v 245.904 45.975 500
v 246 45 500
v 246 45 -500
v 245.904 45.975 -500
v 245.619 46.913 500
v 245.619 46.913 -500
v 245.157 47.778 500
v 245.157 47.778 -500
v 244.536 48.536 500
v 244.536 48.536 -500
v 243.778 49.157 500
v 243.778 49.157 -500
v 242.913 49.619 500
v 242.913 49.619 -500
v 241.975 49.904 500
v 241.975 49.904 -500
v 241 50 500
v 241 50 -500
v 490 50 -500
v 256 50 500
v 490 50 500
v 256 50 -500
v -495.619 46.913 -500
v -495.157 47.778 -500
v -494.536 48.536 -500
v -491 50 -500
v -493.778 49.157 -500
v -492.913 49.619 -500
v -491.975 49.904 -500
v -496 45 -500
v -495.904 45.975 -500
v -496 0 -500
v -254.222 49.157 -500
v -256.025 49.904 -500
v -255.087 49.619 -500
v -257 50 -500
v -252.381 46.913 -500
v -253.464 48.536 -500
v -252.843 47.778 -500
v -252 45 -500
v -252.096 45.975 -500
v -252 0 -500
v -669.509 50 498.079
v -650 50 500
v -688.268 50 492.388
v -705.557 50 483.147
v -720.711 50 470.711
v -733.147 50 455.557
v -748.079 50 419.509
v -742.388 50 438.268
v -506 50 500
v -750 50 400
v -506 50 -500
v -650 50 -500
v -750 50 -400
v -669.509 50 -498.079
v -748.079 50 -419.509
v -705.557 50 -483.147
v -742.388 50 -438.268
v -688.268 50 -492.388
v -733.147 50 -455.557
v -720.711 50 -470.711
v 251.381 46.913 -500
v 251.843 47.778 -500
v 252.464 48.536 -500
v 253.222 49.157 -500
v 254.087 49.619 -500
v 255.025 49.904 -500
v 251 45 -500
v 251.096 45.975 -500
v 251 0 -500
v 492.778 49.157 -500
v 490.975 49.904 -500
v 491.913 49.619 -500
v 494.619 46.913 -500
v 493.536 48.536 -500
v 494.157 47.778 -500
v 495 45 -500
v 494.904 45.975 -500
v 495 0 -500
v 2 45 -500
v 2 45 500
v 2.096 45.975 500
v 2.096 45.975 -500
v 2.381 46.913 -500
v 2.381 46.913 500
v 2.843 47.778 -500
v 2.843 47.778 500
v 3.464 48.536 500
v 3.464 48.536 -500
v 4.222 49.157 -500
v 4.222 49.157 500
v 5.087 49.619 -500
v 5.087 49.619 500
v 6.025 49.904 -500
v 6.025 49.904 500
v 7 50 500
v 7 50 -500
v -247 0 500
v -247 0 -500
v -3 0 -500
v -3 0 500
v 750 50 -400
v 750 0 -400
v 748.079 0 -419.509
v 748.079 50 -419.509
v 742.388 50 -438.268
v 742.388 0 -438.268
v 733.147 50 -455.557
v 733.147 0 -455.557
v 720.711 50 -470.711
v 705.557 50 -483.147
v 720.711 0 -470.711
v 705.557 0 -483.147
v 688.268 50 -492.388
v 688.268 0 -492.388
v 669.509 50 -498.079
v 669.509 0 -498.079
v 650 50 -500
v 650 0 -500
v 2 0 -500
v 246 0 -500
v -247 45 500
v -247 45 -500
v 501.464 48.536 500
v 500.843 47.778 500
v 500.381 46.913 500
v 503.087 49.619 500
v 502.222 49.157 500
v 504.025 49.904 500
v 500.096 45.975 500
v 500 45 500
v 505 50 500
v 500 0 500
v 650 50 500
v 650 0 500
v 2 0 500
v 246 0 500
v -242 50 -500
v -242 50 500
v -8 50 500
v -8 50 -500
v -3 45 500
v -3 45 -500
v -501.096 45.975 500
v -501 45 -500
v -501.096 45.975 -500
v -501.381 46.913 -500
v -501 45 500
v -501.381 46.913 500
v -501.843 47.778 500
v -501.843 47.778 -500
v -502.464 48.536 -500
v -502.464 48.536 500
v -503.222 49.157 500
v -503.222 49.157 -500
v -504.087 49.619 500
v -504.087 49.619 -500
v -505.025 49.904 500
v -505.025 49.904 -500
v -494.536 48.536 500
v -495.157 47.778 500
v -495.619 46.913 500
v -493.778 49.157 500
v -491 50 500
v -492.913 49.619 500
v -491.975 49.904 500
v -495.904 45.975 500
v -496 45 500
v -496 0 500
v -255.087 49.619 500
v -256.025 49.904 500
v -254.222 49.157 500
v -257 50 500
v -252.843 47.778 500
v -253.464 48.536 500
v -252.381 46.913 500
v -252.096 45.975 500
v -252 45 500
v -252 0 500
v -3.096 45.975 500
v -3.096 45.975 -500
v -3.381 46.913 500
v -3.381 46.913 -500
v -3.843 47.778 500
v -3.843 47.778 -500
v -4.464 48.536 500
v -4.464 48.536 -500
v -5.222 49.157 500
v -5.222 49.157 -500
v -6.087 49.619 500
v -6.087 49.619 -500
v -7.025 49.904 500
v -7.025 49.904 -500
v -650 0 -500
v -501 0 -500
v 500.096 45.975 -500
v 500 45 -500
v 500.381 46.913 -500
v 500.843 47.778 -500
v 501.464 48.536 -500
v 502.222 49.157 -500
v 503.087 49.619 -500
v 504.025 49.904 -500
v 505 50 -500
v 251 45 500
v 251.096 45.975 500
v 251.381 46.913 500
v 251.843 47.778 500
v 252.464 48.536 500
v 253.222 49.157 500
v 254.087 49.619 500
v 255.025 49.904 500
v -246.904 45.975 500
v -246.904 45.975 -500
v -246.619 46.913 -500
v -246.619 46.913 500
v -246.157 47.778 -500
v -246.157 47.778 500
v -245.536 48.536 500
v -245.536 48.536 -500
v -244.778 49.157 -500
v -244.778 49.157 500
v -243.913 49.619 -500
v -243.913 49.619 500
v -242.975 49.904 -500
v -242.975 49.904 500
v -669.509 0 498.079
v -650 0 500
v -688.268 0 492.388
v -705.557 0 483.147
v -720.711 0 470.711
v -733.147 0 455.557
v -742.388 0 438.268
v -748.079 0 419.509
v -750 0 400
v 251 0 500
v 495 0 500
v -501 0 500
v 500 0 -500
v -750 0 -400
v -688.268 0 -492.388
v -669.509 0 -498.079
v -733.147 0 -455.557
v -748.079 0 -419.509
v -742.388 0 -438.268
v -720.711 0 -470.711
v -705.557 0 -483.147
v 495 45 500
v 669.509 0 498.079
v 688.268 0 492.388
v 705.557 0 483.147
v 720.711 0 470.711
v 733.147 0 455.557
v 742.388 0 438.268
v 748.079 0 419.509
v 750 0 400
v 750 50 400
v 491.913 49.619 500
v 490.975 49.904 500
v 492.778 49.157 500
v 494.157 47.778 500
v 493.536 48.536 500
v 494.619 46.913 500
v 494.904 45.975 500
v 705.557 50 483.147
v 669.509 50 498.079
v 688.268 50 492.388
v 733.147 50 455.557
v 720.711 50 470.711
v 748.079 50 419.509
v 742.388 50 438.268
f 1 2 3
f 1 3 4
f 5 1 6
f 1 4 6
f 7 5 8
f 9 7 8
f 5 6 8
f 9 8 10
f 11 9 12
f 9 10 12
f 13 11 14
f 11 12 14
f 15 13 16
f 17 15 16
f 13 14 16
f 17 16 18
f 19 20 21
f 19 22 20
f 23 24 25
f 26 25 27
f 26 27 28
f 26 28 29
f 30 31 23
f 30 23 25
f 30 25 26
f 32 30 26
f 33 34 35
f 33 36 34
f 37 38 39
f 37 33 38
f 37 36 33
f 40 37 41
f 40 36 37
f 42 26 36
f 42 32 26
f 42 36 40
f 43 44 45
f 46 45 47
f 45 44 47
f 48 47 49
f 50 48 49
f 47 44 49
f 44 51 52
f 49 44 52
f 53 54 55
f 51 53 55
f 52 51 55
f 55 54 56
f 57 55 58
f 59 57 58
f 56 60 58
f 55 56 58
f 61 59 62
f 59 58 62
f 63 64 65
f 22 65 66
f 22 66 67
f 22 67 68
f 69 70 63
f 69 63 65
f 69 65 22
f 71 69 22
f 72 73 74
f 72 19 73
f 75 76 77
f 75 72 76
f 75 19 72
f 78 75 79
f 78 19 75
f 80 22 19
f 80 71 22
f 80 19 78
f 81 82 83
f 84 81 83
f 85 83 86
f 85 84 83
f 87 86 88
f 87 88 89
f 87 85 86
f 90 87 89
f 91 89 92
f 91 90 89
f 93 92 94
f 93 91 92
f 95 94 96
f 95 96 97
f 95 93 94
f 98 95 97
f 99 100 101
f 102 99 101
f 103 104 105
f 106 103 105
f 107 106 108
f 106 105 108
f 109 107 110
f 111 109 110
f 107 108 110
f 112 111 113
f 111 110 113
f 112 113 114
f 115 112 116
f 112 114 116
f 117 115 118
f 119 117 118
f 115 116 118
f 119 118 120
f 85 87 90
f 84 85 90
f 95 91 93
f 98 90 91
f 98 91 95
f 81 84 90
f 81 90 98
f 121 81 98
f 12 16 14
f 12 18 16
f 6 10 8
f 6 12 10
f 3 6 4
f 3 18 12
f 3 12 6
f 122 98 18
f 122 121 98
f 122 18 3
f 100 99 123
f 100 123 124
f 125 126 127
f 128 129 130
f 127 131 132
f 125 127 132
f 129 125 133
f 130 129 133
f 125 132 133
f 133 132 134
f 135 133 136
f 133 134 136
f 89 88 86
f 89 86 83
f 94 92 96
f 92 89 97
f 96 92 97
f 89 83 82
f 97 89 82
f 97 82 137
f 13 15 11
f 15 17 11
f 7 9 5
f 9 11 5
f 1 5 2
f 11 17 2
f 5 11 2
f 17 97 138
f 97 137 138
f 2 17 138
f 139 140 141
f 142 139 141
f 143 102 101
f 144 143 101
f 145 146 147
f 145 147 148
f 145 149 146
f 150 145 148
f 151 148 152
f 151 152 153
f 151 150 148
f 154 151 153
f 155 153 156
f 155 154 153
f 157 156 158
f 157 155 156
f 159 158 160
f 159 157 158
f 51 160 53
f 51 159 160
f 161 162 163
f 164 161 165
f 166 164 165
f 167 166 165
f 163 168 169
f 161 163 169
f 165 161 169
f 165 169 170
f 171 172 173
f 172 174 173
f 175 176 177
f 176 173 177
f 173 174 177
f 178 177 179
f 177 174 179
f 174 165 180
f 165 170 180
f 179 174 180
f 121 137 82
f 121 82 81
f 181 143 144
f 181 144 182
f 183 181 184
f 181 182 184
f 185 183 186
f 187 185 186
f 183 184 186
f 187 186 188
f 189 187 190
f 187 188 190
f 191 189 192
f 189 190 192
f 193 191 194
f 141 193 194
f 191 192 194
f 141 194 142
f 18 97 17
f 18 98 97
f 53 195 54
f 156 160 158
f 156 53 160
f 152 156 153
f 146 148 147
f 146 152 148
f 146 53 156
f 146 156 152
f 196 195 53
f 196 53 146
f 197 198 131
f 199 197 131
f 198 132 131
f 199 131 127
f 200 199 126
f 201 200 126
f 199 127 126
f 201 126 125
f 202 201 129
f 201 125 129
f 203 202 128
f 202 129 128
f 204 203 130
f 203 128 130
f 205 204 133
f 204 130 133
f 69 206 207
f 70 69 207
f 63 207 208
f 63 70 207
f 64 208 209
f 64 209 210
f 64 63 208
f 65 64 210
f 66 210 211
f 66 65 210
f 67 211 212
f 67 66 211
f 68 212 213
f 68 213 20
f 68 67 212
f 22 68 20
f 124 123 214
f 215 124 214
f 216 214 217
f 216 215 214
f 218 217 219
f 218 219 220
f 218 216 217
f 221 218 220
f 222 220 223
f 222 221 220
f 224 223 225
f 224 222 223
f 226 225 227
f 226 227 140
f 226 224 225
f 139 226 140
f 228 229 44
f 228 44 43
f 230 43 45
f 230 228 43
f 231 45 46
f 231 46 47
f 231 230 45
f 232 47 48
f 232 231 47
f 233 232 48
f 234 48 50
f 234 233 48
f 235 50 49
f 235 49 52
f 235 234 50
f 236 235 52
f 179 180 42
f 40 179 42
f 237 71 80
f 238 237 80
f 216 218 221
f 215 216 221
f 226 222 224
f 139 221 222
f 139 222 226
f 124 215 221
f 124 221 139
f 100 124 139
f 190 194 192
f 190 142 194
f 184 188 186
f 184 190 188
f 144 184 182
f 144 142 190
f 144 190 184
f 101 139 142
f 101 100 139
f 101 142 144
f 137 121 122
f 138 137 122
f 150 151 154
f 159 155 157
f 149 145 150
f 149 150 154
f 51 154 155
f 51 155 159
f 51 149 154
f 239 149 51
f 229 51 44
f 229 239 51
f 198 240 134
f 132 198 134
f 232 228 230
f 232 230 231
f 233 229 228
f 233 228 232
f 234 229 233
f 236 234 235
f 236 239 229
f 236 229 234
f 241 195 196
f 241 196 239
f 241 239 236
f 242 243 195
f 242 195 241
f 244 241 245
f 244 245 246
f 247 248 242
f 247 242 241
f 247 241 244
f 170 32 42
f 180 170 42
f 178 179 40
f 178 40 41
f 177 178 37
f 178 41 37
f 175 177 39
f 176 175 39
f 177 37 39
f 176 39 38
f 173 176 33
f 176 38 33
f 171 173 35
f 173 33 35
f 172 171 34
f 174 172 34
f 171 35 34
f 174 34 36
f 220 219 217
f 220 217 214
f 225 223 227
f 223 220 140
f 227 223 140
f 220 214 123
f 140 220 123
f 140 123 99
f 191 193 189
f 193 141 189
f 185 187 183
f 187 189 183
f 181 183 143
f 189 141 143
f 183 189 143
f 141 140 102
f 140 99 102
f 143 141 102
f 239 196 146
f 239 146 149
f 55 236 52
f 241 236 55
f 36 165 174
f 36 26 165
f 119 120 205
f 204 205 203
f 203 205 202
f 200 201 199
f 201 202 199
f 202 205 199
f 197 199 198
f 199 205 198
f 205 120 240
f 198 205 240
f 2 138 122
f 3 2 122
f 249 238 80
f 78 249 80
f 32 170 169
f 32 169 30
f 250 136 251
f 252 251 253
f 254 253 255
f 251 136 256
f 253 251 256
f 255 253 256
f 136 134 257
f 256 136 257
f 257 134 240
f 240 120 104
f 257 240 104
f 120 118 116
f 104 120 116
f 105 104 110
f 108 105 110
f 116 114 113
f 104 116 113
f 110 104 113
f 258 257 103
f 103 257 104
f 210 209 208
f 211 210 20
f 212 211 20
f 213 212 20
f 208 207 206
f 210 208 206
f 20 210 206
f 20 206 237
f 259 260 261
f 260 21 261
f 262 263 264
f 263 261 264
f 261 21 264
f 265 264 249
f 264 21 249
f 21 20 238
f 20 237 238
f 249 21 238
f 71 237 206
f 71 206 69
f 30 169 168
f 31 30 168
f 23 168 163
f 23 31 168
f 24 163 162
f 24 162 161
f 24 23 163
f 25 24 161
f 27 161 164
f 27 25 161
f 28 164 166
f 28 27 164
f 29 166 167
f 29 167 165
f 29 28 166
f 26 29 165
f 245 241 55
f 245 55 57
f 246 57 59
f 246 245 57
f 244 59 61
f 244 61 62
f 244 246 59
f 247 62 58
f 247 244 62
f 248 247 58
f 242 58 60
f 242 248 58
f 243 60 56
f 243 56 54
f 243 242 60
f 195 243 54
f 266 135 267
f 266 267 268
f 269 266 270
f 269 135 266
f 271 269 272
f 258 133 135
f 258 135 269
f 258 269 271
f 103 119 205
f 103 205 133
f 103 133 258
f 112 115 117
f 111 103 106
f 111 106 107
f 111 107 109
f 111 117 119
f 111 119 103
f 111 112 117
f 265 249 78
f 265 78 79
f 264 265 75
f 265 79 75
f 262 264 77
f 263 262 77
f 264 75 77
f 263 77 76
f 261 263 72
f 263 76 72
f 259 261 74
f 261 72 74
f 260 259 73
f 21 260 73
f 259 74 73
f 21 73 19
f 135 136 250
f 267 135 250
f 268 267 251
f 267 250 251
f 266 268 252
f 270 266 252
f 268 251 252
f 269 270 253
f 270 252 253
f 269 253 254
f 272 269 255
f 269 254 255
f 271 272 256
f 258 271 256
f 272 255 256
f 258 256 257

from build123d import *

# Parameters (mm, degrees)
SALIENTE_EXTRUIR3_DEPTH   = 50
CROQUIS1_W                = 244
CROQUIS1_H                = 1000
SALIENTE_EXTRUIR3_2_DEPTH = 50
SALIENTE_EXTRUIR3_3_DEPTH = 50
SALIENTE_EXTRUIR3_4_DEPTH = 50
SALIENTE_EXTRUIR3_5_DEPTH = 50
SALIENTE_EXTRUIR3_6_DEPTH = 50
REDONDEO1_R               = 5
REDONDEO2_R               = 5
REDONDEO3_R               = 5
REDONDEO4_R               = 5
REDONDEO5_R               = 5
REDONDEO6_R               = 5


with BuildPart() as part:
    # Croquis1 → Saliente-Extruir3 (new body)
    with BuildSketch(Plane(origin=(0, 0, 0), x_dir=(1, 0, 0), z_dir=(0, 1, 0))):
        with BuildLine():
            ThreePointArc((-650, -500), (-720.710678119, -470.710678119), (-750, -400))
            Line((-750, -400), (-750, 400))
            ThreePointArc((-750, 400), (-720.710678119, 470.710678119), (-650, 500))
            Line((-650, 500), (-501, 500))
            Line((-501, 500), (-501, -500))
            Line((-501, -500), (-650, -500))
        make_face()
    extrude(amount=SALIENTE_EXTRUIR3_DEPTH)

    # Redondeo1
    redondeo1_edges = [part.edges().sort_by_distance(p)[0] for p in [
        (-501, 50, 0),
    ]]
    fillet(redondeo1_edges, radius=REDONDEO1_R)


with BuildPart() as body_2:
    # Croquis1 → Saliente-Extruir3 2 (new body)
    with BuildSketch(Plane(origin=(0, 0, 0), x_dir=(1, 0, 0), z_dir=(0, 1, 0))):
        with Locations((-374, 0)):
            Rectangle(CROQUIS1_W, CROQUIS1_H)
    extrude(amount=SALIENTE_EXTRUIR3_2_DEPTH)

    # Redondeo2
    redondeo2_edges = [body_2.edges().sort_by_distance(p)[0] for p in [
        (-496, 50, 0),
        (-252, 50, 0),
    ]]
    fillet(redondeo2_edges, radius=REDONDEO2_R)


with BuildPart() as body_3:
    # Croquis1 → Saliente-Extruir3 3 (new body)
    with BuildSketch(Plane(origin=(0, 0, 0), x_dir=(1, 0, 0), z_dir=(0, 1, 0))):
        with Locations((-125, 0)):
            Rectangle(CROQUIS1_W, CROQUIS1_H)
    extrude(amount=SALIENTE_EXTRUIR3_3_DEPTH)

    # Redondeo3
    redondeo3_edges = [body_3.edges().sort_by_distance(p)[0] for p in [
        (-247, 50, 0),
        (-3, 50, 0),
    ]]
    fillet(redondeo3_edges, radius=REDONDEO3_R)


with BuildPart() as body_4:
    # Croquis1 → Saliente-Extruir3 4 (new body)
    with BuildSketch(Plane(origin=(0, 0, 0), x_dir=(1, 0, 0), z_dir=(0, 1, 0))):
        with Locations((124, 0)):
            Rectangle(CROQUIS1_W, CROQUIS1_H)
    extrude(amount=SALIENTE_EXTRUIR3_4_DEPTH)

    # Redondeo4
    redondeo4_edges = [body_4.edges().sort_by_distance(p)[0] for p in [
        (2, 50, 0),
        (246, 50, 0),
    ]]
    fillet(redondeo4_edges, radius=REDONDEO4_R)


with BuildPart() as body_5:
    # Croquis1 → Saliente-Extruir3 5 (new body)
    with BuildSketch(Plane(origin=(0, 0, 0), x_dir=(1, 0, 0), z_dir=(0, 1, 0))):
        with Locations((373, 0)):
            Rectangle(CROQUIS1_W, CROQUIS1_H)
    extrude(amount=SALIENTE_EXTRUIR3_5_DEPTH)

    # Redondeo5
    redondeo5_edges = [body_5.edges().sort_by_distance(p)[0] for p in [
        (251, 50, 0),
        (495, 50, 0),
    ]]
    fillet(redondeo5_edges, radius=REDONDEO5_R)


with BuildPart() as body_6:
    # Croquis1 → Saliente-Extruir3 6 (new body)
    with BuildSketch(Plane(origin=(0, 0, 0), x_dir=(1, 0, 0), z_dir=(0, 1, 0))):
        with BuildLine():
            Line((500, -500), (650, -500))
            ThreePointArc((650, -500), (720.710678119, -470.710678119), (750, -400))
            Line((750, -400), (750, 400))
            ThreePointArc((750, 400), (720.710678119, 470.710678119), (650, 500))
            Line((650, 500), (500, 500))
            Line((500, 500), (500, -500))
        make_face()
    extrude(amount=SALIENTE_EXTRUIR3_6_DEPTH)

    # Redondeo6
    redondeo6_edges = [body_6.edges().sort_by_distance(p)[0] for p in [
        (500, 50, 0),
    ]]
    fillet(redondeo6_edges, radius=REDONDEO6_R)


solid = Compound([part.part, body_2.part, body_3.part, body_4.part, body_5.part, body_6.part])
